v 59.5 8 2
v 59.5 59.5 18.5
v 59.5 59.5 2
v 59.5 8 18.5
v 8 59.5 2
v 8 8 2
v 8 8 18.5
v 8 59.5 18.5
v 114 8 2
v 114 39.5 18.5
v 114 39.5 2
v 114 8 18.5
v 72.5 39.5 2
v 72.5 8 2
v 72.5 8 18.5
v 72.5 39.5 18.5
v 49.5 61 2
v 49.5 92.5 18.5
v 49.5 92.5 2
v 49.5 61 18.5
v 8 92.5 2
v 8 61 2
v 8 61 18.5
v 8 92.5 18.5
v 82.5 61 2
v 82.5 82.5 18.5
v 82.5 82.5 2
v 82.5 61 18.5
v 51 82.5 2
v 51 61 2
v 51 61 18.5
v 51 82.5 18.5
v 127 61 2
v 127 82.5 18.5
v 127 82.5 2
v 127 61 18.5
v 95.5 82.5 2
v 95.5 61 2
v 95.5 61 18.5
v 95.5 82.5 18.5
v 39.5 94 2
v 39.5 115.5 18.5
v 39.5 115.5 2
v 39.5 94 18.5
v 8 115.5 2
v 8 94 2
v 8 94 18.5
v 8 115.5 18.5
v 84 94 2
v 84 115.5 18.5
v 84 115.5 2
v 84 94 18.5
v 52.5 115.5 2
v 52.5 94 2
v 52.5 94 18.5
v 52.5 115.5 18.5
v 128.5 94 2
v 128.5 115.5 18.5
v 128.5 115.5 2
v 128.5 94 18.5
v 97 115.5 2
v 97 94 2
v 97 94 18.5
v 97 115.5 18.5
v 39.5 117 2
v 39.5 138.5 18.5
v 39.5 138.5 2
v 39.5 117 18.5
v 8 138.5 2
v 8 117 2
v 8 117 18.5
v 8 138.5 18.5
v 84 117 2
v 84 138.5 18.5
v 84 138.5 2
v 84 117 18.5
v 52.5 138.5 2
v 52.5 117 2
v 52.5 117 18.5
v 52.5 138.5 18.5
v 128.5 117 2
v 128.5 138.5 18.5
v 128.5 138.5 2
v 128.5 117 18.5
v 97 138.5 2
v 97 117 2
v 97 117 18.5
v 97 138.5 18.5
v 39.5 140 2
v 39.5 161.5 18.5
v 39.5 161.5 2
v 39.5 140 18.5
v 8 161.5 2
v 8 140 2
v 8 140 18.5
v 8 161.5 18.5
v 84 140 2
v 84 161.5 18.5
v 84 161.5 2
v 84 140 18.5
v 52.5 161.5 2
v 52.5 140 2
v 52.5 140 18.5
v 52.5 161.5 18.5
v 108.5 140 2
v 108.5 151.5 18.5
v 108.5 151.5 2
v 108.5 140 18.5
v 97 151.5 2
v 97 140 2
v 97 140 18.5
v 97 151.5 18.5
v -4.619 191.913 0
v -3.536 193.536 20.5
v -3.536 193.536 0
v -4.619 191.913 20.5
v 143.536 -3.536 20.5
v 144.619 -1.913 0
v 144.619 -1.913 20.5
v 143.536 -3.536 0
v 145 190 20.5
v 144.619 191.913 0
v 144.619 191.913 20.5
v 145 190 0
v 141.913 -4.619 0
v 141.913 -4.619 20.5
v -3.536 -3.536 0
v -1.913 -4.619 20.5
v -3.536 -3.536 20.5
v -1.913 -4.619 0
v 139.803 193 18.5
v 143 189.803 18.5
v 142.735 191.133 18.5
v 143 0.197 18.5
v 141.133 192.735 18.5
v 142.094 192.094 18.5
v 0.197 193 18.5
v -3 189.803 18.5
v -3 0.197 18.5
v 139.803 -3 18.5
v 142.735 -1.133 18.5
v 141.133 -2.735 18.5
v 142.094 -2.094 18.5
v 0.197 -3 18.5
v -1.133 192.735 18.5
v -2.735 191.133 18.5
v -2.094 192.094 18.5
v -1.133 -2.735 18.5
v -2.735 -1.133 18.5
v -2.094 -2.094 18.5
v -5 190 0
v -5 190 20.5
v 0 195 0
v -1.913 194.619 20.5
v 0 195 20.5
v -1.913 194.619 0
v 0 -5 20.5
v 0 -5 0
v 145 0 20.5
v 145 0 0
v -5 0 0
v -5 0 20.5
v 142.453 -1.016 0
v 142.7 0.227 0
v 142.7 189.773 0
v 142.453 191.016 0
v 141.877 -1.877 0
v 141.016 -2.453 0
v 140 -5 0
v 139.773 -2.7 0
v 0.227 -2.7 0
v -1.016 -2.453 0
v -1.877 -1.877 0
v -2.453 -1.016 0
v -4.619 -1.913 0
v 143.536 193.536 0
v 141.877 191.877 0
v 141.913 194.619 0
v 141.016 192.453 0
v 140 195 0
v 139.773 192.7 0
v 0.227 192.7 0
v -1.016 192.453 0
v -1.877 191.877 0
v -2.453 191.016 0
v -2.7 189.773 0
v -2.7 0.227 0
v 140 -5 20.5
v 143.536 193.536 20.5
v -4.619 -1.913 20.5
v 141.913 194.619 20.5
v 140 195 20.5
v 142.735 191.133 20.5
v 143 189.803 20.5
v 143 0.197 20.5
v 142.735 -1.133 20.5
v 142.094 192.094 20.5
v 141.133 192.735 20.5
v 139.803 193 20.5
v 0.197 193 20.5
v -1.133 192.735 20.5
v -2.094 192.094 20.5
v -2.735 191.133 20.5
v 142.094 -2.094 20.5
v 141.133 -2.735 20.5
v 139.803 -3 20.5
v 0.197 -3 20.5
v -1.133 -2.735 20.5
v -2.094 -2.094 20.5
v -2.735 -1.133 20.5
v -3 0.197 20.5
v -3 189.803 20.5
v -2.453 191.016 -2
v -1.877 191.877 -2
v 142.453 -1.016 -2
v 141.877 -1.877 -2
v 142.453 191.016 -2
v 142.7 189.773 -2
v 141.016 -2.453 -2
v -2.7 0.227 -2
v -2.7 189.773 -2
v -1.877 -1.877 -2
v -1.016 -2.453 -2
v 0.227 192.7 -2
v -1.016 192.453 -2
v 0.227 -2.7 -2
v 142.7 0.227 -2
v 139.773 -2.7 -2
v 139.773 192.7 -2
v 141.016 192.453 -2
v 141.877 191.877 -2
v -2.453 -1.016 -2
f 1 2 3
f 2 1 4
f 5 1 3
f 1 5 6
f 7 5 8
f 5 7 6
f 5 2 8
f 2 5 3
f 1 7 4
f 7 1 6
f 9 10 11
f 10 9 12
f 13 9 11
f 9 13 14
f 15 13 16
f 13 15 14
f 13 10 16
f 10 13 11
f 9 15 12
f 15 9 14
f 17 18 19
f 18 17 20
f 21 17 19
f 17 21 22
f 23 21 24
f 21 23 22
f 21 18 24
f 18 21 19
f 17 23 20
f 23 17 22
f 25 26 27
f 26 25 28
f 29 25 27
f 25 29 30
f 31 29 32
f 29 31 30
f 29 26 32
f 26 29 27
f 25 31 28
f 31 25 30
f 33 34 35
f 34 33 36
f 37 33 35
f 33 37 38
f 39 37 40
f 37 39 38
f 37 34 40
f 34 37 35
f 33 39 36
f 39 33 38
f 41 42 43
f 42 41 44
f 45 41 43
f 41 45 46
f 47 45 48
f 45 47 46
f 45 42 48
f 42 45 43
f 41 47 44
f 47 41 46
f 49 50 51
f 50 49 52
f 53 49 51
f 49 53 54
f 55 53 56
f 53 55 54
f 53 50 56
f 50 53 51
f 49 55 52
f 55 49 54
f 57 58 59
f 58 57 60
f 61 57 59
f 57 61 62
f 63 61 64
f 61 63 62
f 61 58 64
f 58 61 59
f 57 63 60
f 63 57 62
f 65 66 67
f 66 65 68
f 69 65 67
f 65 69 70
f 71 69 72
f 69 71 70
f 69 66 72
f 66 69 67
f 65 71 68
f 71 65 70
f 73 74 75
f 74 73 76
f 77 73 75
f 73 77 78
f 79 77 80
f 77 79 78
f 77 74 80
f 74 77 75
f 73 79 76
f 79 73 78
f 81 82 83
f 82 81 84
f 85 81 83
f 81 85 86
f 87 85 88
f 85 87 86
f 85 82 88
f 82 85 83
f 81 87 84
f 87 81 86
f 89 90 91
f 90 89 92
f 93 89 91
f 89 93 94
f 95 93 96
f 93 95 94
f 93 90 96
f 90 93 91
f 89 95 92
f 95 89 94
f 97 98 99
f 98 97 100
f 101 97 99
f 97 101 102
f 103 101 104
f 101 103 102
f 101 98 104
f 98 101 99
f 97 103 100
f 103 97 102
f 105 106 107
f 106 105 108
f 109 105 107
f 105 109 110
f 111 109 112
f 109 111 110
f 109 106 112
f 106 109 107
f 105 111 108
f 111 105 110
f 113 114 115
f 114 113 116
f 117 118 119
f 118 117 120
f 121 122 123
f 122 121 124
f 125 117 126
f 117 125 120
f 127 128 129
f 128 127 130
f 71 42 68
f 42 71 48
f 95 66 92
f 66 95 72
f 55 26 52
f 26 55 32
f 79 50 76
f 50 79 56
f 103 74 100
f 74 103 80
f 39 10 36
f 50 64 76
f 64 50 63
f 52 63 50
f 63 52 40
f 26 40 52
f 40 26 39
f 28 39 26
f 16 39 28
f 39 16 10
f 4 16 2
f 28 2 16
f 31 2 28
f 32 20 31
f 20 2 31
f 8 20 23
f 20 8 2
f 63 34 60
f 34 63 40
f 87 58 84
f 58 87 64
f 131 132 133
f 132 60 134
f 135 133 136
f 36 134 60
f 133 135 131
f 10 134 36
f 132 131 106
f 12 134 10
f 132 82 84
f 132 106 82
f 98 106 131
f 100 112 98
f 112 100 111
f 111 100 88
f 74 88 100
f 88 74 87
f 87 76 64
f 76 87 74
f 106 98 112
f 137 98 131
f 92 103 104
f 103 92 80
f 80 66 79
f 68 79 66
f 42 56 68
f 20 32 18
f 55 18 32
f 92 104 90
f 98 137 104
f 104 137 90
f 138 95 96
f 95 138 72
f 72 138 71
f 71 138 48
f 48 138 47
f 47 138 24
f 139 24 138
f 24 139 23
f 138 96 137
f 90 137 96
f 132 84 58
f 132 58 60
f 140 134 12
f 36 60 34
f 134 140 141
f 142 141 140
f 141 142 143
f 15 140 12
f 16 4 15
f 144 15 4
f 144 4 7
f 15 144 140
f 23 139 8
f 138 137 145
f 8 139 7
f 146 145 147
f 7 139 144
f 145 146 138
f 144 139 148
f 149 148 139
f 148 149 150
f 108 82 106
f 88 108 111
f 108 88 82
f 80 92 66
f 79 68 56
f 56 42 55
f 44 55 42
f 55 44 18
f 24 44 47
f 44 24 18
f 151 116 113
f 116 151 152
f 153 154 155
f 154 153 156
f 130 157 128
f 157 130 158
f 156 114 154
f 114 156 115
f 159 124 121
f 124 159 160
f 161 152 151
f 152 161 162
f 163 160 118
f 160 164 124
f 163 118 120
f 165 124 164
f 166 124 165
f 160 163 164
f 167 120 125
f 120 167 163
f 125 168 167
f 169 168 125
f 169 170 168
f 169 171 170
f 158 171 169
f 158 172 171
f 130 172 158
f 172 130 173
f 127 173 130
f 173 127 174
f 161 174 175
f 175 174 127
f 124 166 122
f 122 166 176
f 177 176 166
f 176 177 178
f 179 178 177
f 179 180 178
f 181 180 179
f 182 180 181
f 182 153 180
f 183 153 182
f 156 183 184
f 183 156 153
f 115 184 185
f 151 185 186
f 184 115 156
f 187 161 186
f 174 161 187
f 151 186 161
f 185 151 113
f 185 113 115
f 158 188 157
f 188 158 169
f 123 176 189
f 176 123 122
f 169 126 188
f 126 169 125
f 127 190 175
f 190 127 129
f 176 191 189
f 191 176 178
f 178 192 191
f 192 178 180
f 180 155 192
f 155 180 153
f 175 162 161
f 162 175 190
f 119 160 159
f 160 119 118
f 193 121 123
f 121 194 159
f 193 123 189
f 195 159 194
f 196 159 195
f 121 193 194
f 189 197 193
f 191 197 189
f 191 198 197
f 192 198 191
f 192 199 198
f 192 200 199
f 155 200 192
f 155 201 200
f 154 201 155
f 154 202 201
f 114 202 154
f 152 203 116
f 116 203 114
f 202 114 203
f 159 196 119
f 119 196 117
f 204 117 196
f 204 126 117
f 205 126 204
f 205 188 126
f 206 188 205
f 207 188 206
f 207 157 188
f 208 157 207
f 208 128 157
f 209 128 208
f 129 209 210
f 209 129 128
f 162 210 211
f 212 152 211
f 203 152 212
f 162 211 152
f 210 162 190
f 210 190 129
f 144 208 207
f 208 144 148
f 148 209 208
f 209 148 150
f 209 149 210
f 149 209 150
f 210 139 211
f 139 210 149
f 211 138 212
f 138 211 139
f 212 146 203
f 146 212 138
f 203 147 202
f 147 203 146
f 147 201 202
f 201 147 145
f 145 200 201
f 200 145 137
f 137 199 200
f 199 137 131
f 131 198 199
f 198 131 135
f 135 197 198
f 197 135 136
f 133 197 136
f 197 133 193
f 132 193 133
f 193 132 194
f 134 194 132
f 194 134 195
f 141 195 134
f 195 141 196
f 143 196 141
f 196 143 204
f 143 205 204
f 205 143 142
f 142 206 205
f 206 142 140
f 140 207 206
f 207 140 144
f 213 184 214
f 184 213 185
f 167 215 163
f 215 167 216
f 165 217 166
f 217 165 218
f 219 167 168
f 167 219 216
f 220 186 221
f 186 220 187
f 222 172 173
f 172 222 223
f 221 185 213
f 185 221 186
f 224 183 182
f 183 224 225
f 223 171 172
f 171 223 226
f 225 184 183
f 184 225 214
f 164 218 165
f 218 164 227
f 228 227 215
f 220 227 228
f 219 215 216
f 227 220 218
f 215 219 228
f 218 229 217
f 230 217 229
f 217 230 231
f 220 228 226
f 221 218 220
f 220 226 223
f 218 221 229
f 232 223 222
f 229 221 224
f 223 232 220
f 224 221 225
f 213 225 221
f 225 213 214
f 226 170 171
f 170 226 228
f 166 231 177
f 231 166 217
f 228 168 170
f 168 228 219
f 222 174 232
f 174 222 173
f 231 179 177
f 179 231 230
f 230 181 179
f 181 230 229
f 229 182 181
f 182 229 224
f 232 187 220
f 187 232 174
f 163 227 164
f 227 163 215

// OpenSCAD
// Generated by SolidPython 1.1.3 on 2026-02-21 19:37:22


union() {
	union() {
		difference() {
			linear_extrude(height = 18.5000000000) {
				offset(r = 5.0000000000) {
					square(size = [140.0000000000, 190.0000000000]);
				}
			}
			union() {
				translate(v = [8.0000000000, 8.0000000000, 2.0000000000]) {
					cube(size = [51.5000000000, 51.5000000000, 16.5100000000]);
				}
				translate(v = [72.5000000000, 8.0000000000, 2.0000000000]) {
					cube(size = [41.5000000000, 31.5000000000, 16.5100000000]);
				}
				translate(v = [8.0000000000, 61.0000000000, 2.0000000000]) {
					cube(size = [41.5000000000, 31.5000000000, 16.5100000000]);
				}
				translate(v = [51.0000000000, 61.0000000000, 2.0000000000]) {
					cube(size = [31.5000000000, 21.5000000000, 16.5100000000]);
				}
				translate(v = [95.5000000000, 61.0000000000, 2.0000000000]) {
					cube(size = [31.5000000000, 21.5000000000, 16.5100000000]);
				}
				translate(v = [8.0000000000, 94.0000000000, 2.0000000000]) {
					cube(size = [31.5000000000, 21.5000000000, 16.5100000000]);
				}
				translate(v = [52.5000000000, 94.0000000000, 2.0000000000]) {
					cube(size = [31.5000000000, 21.5000000000, 16.5100000000]);
				}
				translate(v = [97.0000000000, 94.0000000000, 2.0000000000]) {
					cube(size = [31.5000000000, 21.5000000000, 16.5100000000]);
				}
				translate(v = [8.0000000000, 117.0000000000, 2.0000000000]) {
					cube(size = [31.5000000000, 21.5000000000, 16.5100000000]);
				}
				translate(v = [52.5000000000, 117.0000000000, 2.0000000000]) {
					cube(size = [31.5000000000, 21.5000000000, 16.5100000000]);
				}
				translate(v = [97.0000000000, 117.0000000000, 2.0000000000]) {
					cube(size = [31.5000000000, 21.5000000000, 16.5100000000]);
				}
				translate(v = [8.0000000000, 140.0000000000, 2.0000000000]) {
					cube(size = [31.5000000000, 21.5000000000, 16.5100000000]);
				}
				translate(v = [52.5000000000, 140.0000000000, 2.0000000000]) {
					cube(size = [31.5000000000, 21.5000000000, 16.5100000000]);
				}
				translate(v = [97.0000000000, 140.0000000000, 2.0000000000]) {
					cube(size = [11.5000000000, 11.5000000000, 16.5100000000]);
				}
			}
		}
		translate(v = [0, 0, 18.5000000000]) {
			linear_extrude(height = 2.0000000000) {
				difference() {
					offset(r = 5.0000000000) {
						square(size = [140.0000000000, 190.0000000000]);
					}
					offset(r = -2.0000000000) {
						offset(r = 5.0000000000) {
							square(size = [140.0000000000, 190.0000000000]);
						}
					}
				}
			}
		}
	}
	translate(v = [0, 0, -2.0000000000]) {
		linear_extrude(height = 2.0000000000) {
			offset(r = -2.3000000000) {
				offset(r = 5.0000000000) {
					square(size = [140.0000000000, 190.0000000000]);
				}
			}
		}
	}
}
/***********************************************
*********      SolidPython code:      **********
************************************************
 
"""SolidPython geometry building for storage cases."""

from typing import List, Union

from solid import (
    cube,
    difference,
    linear_extrude,
    offset,
    scad_render_to_file,
    square,
    translate,
    union,
)

from .config import Config
from .layout import GridLayoutResult, MixedLayoutResult, SlotRect


def build_base_tray(
    slots: List[SlotRect],
    total_width: float,
    total_length: float,
    config: Config,
):
    """Build the solid base tray (floor + perimeter walls) with slot cavities subtracted."""
    wall = config.wall_thickness
    base_h = config.base_height
    max_height = max(s.height for s in slots)

    if config.case_size is not None:
        outer_x, outer_y = config.case_size
    outer_z = base_h + max_height
    r = config.corner_radius

    if config.case_size is not None:
        pass  # outer_x, outer_y already set
    else:
        corner_inset = (r + 1.0) if r > 0 else 0
        corner_padding = 2 * corner_inset
        outer_x = total_width + 2 * wall + corner_padding
        outer_y = total_length + 2 * wall + corner_padding

    if r > 0:
        # Round only outer corners in XY plane: 2D offset + linear_extrude
        base_2d = square([outer_x - 2 * r, outer_y - 2 * r])
        rounded_2d = offset(r=r)(base_2d)
        outer_box = linear_extrude(height=outer_z)(rounded_2d)
    else:
        outer_box = cube([outer_x, outer_y, outer_z])

    # Subtract each slot cavity (use uniform depth so all slots are clearly visible)
    # Inset by corner_radius + safety margin so cavities don't cut into rounded corners
    cavity_inset = (r + 1.0) if r > 0 else 0
    cavities = []
    for slot in slots:
        cavity = translate([wall + cavity_inset + slot.x, wall + cavity_inset + slot.y, base_h])(
            cube([slot.width, slot.length, max_height + 0.01])  # +epsilon for clean cut
        )
        cavities.append(cavity)

    if cavities:
        tray = difference()(outer_box, union()(*cavities))
    else:
        tray = outer_box

    if config.stackable:
        lip_inner = config.stack_lip_inner
        lip_height = config.stack_lip_height
        clearance = config.stack_clearance

        # Top lip: extends INWARD from top (original design)
        if r > 0:
            outer_2d = offset(r=r)(square([outer_x - 2 * r, outer_y - 2 * r]))
        else:
            outer_2d = square([outer_x, outer_y])
        inner_2d = offset(r=-lip_inner)(outer_2d)
        lip_ring = difference()(outer_2d, inner_2d)

        lip_3d = translate([0, 0, outer_z])(linear_extrude(height=lip_height)(lip_ring))
        tray = union()(tray, lip_3d)

        # Bottom foot: extends DOWN with shape matching lip opening (negative of lip)
        # Foot fits into the lip opening and sits on the ledge
        foot_2d = offset(r=-(lip_inner + clearance))(outer_2d)
        foot_3d = translate([0, 0, -lip_height])(linear_extrude(height=lip_height)(foot_2d))
        tray = union()(tray, foot_3d)

    return tray


def assemble_case(
    layout_result: Union[GridLayoutResult, MixedLayoutResult],
    config: Config,
):
    """Assemble the complete case: base tray with slot cavities (dividers are implicit)."""
    slots = layout_result.slots
    total_width = layout_result.total_width
    total_length = layout_result.total_length

    case = build_base_tray(slots, total_width, total_length, config)
    return case


def render_to_file(assembly, filepath: str) -> None:
    """Render the assembly to an OpenSCAD .scad file."""
    scad_render_to_file(assembly, filepath)
 
 
************************************************/
